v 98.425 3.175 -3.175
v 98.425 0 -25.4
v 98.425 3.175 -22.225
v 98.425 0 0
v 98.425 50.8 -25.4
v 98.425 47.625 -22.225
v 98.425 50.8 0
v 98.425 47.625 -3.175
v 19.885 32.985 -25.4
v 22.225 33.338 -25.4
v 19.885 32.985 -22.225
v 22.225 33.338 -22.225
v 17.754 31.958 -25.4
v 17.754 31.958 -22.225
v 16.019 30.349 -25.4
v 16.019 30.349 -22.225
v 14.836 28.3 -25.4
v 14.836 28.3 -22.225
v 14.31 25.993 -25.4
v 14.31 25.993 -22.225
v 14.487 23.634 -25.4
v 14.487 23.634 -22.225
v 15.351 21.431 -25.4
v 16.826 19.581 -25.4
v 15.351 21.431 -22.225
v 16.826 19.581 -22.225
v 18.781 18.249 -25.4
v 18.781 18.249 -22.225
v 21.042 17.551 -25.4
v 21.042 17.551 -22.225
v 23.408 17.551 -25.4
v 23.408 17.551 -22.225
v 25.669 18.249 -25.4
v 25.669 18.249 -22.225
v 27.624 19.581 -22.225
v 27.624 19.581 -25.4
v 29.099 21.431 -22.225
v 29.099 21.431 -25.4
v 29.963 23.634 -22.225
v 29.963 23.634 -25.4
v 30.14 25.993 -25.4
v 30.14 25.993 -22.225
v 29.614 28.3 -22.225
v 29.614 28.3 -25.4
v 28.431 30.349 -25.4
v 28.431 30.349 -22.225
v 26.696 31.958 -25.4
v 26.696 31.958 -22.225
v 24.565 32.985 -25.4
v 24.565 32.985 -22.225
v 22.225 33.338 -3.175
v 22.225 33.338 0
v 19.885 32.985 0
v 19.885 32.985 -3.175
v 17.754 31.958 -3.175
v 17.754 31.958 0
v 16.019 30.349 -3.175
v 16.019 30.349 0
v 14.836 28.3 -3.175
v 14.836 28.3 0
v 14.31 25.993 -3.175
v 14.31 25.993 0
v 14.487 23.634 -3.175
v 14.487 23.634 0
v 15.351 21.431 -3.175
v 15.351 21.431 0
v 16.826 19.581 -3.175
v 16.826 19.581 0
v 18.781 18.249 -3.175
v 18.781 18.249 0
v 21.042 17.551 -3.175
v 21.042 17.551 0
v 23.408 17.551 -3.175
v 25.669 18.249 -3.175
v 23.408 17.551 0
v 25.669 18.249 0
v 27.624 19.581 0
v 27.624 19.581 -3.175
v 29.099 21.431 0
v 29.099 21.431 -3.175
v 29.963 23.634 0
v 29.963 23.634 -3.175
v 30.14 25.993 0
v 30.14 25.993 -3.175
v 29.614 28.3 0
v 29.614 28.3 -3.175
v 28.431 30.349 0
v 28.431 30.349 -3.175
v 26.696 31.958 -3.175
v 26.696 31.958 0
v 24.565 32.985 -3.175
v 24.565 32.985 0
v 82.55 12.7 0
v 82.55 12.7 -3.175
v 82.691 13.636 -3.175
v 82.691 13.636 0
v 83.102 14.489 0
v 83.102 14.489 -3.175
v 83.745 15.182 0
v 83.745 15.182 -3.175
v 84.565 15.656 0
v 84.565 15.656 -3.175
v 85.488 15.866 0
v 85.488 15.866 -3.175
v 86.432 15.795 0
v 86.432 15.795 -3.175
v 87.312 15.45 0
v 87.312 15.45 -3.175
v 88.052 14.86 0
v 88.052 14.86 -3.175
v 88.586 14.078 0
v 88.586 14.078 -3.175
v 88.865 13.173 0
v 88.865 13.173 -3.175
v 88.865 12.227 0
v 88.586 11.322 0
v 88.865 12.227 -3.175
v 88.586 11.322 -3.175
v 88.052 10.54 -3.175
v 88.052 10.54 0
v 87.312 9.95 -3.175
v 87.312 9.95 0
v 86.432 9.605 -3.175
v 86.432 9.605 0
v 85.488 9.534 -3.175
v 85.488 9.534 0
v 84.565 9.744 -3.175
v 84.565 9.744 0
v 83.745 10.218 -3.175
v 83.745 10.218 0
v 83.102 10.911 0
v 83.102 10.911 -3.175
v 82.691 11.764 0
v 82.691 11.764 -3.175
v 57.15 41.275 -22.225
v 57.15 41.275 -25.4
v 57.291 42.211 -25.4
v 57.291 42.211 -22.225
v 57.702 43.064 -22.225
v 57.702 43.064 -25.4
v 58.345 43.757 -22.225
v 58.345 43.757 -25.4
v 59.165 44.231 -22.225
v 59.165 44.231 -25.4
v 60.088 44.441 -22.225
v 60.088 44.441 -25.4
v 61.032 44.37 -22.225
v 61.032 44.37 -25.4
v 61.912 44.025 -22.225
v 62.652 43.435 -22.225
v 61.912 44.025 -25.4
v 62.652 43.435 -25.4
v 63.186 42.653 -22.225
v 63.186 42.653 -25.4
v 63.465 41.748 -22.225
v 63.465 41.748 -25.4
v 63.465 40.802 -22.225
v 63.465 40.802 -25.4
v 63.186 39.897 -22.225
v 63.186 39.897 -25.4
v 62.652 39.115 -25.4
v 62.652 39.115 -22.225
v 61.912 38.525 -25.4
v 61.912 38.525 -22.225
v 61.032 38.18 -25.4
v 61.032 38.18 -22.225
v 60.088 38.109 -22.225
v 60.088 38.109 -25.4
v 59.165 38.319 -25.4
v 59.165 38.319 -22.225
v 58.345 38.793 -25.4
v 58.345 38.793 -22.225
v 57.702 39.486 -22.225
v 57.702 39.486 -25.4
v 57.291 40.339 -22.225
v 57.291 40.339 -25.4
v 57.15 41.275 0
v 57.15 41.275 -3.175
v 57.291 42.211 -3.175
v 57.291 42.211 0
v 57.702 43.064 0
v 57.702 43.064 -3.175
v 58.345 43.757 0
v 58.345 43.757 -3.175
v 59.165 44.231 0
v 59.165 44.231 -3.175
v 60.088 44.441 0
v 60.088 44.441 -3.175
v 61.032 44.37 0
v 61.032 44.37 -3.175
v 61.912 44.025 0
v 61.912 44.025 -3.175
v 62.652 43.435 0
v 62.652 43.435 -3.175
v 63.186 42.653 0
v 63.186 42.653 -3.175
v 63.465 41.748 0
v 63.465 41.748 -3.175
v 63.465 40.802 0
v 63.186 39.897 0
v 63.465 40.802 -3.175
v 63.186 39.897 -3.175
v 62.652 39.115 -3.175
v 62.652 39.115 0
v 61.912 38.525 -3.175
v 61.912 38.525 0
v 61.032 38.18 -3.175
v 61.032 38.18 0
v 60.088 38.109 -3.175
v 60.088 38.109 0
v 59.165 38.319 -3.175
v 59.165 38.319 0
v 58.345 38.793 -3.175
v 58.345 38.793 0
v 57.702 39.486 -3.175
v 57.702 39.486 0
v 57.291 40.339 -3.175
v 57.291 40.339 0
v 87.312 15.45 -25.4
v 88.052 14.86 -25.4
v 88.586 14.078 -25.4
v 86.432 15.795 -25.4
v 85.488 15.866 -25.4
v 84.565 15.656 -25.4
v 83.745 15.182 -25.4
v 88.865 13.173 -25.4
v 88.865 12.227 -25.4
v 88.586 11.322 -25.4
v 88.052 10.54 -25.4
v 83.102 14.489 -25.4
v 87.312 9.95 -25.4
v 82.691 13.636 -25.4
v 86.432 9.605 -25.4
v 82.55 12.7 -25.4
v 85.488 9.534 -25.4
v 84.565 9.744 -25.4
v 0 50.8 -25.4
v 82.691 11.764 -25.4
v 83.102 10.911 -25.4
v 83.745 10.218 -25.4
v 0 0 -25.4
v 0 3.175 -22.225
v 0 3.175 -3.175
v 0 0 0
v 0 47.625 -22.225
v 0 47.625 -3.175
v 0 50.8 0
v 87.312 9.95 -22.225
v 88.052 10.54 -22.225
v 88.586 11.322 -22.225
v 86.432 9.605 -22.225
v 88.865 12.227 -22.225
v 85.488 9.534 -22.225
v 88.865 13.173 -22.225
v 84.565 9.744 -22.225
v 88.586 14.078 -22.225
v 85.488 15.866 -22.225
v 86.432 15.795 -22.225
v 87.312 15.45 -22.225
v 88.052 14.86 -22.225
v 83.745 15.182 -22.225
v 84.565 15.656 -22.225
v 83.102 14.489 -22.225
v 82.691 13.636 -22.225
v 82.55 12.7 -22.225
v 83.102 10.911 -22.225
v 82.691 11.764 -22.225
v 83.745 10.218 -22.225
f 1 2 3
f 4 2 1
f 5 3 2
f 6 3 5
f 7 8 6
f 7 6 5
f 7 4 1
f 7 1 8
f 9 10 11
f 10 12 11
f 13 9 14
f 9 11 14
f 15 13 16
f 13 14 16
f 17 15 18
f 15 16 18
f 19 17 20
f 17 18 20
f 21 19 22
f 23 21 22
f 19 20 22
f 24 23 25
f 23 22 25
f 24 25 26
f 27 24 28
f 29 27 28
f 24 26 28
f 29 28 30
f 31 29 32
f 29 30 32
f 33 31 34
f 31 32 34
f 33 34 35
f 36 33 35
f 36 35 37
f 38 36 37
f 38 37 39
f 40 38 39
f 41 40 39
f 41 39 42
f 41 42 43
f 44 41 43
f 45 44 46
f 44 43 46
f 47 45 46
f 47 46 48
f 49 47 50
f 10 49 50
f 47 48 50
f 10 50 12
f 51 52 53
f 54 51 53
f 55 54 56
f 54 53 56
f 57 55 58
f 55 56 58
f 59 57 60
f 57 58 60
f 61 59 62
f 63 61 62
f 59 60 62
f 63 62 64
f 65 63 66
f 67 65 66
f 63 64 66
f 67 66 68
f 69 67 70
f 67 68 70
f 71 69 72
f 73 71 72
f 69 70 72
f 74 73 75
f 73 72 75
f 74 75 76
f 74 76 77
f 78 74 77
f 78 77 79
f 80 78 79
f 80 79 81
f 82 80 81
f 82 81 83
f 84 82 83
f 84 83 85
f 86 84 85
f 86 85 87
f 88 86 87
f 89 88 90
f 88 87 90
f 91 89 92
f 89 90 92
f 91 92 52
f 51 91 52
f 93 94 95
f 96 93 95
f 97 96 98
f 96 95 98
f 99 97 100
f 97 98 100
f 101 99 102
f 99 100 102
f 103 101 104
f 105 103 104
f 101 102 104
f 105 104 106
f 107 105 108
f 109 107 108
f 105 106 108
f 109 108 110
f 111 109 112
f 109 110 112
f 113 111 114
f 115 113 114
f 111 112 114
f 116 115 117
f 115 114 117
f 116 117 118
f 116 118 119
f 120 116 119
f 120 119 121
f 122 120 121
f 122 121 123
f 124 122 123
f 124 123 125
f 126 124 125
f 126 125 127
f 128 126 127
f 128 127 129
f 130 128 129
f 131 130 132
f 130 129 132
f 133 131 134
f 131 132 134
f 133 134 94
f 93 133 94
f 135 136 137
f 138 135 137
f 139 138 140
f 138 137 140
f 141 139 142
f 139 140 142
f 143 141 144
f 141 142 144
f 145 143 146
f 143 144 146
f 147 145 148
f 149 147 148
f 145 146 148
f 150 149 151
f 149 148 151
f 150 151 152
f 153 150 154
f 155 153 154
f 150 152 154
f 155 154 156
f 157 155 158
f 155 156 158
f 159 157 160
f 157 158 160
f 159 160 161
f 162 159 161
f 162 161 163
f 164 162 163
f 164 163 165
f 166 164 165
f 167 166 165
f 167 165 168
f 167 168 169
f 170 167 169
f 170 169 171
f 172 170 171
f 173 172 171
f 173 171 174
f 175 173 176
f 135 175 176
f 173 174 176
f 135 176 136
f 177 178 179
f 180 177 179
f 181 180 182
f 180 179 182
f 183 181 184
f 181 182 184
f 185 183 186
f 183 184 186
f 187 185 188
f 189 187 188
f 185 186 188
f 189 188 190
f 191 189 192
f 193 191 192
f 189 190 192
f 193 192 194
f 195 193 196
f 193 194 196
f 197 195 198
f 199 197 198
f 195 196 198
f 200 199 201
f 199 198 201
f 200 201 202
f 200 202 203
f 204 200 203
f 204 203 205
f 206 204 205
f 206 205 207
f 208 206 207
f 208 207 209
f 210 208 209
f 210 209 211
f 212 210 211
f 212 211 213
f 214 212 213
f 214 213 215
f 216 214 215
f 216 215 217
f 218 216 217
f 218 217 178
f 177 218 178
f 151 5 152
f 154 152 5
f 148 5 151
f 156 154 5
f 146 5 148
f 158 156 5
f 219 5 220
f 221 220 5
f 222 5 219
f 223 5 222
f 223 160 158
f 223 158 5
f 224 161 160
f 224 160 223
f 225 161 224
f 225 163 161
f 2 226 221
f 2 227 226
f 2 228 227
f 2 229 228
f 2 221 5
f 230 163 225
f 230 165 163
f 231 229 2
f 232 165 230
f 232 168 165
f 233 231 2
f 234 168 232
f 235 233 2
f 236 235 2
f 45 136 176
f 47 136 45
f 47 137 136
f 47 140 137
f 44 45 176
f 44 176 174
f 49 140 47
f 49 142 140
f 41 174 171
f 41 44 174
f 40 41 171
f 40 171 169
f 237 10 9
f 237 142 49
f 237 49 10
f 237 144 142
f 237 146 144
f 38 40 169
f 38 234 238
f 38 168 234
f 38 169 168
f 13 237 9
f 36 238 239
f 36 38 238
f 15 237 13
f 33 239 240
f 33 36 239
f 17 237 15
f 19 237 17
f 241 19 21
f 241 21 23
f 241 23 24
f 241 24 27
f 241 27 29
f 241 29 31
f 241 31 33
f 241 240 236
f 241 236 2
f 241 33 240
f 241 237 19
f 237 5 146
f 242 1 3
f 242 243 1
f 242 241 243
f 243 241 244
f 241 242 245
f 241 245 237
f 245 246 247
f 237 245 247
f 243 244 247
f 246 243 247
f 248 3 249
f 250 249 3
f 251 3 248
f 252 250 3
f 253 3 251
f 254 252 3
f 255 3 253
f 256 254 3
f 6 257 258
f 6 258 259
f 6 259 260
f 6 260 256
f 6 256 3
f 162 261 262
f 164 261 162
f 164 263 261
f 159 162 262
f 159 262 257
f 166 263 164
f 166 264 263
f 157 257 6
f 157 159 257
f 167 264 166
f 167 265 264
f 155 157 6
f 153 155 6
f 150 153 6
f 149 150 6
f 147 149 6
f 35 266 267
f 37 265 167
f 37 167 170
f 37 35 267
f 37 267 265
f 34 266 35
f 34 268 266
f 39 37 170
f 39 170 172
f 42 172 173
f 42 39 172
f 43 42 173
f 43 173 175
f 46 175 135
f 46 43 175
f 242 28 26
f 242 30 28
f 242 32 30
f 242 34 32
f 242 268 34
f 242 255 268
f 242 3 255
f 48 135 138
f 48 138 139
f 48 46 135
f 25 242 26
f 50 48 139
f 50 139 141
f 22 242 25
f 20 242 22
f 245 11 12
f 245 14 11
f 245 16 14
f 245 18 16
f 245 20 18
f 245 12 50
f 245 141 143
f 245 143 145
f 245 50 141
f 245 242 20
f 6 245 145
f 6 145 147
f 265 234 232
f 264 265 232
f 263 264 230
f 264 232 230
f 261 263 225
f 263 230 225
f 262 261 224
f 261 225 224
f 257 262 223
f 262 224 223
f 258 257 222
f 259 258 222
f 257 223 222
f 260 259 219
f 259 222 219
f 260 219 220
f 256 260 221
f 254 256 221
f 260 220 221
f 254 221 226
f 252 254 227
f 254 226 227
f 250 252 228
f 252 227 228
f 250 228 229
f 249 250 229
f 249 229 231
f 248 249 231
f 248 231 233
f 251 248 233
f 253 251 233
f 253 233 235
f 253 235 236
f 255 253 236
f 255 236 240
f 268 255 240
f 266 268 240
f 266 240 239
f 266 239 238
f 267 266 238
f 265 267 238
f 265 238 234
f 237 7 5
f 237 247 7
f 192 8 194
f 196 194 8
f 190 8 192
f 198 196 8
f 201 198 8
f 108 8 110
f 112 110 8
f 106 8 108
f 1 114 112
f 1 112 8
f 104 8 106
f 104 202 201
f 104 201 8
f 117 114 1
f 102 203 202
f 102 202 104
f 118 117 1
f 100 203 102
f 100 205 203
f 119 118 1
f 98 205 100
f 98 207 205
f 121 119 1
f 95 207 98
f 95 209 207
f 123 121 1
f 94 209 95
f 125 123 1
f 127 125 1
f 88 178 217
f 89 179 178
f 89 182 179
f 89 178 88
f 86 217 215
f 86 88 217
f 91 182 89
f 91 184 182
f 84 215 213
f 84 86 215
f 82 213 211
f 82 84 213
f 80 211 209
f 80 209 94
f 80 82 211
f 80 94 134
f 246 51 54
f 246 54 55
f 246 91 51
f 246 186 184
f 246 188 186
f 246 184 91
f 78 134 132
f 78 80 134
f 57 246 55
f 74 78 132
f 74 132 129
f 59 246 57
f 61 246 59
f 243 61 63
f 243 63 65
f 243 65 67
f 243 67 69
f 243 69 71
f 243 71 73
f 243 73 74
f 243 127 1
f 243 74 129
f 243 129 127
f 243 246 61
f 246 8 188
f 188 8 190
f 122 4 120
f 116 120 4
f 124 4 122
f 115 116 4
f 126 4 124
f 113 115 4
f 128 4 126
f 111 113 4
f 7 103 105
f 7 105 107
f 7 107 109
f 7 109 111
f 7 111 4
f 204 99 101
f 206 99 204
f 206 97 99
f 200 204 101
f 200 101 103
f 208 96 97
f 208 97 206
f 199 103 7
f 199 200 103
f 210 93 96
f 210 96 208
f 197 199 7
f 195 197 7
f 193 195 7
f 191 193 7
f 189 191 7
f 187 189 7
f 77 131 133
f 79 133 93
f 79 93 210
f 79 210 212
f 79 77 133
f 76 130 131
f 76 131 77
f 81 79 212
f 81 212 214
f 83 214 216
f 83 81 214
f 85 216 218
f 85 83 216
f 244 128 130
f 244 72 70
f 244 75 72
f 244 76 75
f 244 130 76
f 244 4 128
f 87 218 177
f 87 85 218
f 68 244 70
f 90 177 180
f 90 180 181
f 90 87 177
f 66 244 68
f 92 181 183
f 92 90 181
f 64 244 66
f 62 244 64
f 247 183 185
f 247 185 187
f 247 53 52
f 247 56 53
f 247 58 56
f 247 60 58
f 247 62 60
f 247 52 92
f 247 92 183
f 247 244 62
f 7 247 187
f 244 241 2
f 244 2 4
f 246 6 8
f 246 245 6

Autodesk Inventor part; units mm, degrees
ref_plane "YZ Plane" through (0, 0, 0) normal (1, 0, 0) x (0, 1, 0)
ref_plane "XZ Plane" through (0, 0, 0) normal (0, 1, 0) x (-1, 0, 0)
ref_plane "XY Plane" through (0, 0, 0) normal (0, 0, 1) x (1, 0, 0)
sketch "Sketch1" plane through (0, 0, 0) normal (1, 0, 0) x (0, 1, 0)
  line L0 (0, 0) -> (50.8, 0)
  line L1 (50.8, 0) -> (50.8, -25.4)
  line L2 (50.8, -25.4) -> (0, -25.4)
  line L3 (0, -25.4) -> (0, 0)
  line L4 (47.625, -3.175) -> (3.175, -3.175)
  line L5 (3.175, -3.175) -> (3.175, -22.225)
  line L6 (3.175, -22.225) -> (47.625, -22.225)
  line L7 (47.625, -22.225) -> (47.625, -3.175)
  dimension "d0" = 50.8
  dimension "d1" = 25.4
  dimension "d2" = 3.175
extrude "Extrusion1" add sketch "Sketch1" along normal blind 98.425
sketch "Sketch2" plane through (0, 0, -25.4) normal (0, 0, -1) x (-1, 0, 0)
  line L0 (0, 50.8) -> (-98.425, 50.8) projected
  line L1 (0, 50.8) -> (0, 0) projected
  line L2 (0, 0) -> (-98.425, 0) projected
  point P0 (-22.225, 25.4)
  dimension "d5" = 25.4
  dimension "d6" = 22.225
hole "Hole2" at (22.225, 25.4, -25.4) direction (0, 0, 1) diameter 15.875 end through all
sketch "Sketch3" plane through (0, 0, -25.4) normal (0, 0, -1) x (-1, 0, 0)
  circle A0 centre (-85.725, 12.7) radius 3.175
  circle A1 centre (-60.325, 41.275) radius 3.175
  line L0 (0, 0) -> (-98.425, 0) projected
  line L1 (-98.425, 0) -> (-98.425, 50.8) projected
  dimension "d23" = 6.35
  dimension "d24" = 6.35
  dimension "d25" = 12.7
  dimension "d26" = 38.1
  dimension "d27" = 41.275
  dimension "d28" = 12.7
extrude "Extrusion2" cut sketch "Sketch3" against normal blind 25.4
properties part number "15102898-16-P-0304" material "Aluminum 6061"
